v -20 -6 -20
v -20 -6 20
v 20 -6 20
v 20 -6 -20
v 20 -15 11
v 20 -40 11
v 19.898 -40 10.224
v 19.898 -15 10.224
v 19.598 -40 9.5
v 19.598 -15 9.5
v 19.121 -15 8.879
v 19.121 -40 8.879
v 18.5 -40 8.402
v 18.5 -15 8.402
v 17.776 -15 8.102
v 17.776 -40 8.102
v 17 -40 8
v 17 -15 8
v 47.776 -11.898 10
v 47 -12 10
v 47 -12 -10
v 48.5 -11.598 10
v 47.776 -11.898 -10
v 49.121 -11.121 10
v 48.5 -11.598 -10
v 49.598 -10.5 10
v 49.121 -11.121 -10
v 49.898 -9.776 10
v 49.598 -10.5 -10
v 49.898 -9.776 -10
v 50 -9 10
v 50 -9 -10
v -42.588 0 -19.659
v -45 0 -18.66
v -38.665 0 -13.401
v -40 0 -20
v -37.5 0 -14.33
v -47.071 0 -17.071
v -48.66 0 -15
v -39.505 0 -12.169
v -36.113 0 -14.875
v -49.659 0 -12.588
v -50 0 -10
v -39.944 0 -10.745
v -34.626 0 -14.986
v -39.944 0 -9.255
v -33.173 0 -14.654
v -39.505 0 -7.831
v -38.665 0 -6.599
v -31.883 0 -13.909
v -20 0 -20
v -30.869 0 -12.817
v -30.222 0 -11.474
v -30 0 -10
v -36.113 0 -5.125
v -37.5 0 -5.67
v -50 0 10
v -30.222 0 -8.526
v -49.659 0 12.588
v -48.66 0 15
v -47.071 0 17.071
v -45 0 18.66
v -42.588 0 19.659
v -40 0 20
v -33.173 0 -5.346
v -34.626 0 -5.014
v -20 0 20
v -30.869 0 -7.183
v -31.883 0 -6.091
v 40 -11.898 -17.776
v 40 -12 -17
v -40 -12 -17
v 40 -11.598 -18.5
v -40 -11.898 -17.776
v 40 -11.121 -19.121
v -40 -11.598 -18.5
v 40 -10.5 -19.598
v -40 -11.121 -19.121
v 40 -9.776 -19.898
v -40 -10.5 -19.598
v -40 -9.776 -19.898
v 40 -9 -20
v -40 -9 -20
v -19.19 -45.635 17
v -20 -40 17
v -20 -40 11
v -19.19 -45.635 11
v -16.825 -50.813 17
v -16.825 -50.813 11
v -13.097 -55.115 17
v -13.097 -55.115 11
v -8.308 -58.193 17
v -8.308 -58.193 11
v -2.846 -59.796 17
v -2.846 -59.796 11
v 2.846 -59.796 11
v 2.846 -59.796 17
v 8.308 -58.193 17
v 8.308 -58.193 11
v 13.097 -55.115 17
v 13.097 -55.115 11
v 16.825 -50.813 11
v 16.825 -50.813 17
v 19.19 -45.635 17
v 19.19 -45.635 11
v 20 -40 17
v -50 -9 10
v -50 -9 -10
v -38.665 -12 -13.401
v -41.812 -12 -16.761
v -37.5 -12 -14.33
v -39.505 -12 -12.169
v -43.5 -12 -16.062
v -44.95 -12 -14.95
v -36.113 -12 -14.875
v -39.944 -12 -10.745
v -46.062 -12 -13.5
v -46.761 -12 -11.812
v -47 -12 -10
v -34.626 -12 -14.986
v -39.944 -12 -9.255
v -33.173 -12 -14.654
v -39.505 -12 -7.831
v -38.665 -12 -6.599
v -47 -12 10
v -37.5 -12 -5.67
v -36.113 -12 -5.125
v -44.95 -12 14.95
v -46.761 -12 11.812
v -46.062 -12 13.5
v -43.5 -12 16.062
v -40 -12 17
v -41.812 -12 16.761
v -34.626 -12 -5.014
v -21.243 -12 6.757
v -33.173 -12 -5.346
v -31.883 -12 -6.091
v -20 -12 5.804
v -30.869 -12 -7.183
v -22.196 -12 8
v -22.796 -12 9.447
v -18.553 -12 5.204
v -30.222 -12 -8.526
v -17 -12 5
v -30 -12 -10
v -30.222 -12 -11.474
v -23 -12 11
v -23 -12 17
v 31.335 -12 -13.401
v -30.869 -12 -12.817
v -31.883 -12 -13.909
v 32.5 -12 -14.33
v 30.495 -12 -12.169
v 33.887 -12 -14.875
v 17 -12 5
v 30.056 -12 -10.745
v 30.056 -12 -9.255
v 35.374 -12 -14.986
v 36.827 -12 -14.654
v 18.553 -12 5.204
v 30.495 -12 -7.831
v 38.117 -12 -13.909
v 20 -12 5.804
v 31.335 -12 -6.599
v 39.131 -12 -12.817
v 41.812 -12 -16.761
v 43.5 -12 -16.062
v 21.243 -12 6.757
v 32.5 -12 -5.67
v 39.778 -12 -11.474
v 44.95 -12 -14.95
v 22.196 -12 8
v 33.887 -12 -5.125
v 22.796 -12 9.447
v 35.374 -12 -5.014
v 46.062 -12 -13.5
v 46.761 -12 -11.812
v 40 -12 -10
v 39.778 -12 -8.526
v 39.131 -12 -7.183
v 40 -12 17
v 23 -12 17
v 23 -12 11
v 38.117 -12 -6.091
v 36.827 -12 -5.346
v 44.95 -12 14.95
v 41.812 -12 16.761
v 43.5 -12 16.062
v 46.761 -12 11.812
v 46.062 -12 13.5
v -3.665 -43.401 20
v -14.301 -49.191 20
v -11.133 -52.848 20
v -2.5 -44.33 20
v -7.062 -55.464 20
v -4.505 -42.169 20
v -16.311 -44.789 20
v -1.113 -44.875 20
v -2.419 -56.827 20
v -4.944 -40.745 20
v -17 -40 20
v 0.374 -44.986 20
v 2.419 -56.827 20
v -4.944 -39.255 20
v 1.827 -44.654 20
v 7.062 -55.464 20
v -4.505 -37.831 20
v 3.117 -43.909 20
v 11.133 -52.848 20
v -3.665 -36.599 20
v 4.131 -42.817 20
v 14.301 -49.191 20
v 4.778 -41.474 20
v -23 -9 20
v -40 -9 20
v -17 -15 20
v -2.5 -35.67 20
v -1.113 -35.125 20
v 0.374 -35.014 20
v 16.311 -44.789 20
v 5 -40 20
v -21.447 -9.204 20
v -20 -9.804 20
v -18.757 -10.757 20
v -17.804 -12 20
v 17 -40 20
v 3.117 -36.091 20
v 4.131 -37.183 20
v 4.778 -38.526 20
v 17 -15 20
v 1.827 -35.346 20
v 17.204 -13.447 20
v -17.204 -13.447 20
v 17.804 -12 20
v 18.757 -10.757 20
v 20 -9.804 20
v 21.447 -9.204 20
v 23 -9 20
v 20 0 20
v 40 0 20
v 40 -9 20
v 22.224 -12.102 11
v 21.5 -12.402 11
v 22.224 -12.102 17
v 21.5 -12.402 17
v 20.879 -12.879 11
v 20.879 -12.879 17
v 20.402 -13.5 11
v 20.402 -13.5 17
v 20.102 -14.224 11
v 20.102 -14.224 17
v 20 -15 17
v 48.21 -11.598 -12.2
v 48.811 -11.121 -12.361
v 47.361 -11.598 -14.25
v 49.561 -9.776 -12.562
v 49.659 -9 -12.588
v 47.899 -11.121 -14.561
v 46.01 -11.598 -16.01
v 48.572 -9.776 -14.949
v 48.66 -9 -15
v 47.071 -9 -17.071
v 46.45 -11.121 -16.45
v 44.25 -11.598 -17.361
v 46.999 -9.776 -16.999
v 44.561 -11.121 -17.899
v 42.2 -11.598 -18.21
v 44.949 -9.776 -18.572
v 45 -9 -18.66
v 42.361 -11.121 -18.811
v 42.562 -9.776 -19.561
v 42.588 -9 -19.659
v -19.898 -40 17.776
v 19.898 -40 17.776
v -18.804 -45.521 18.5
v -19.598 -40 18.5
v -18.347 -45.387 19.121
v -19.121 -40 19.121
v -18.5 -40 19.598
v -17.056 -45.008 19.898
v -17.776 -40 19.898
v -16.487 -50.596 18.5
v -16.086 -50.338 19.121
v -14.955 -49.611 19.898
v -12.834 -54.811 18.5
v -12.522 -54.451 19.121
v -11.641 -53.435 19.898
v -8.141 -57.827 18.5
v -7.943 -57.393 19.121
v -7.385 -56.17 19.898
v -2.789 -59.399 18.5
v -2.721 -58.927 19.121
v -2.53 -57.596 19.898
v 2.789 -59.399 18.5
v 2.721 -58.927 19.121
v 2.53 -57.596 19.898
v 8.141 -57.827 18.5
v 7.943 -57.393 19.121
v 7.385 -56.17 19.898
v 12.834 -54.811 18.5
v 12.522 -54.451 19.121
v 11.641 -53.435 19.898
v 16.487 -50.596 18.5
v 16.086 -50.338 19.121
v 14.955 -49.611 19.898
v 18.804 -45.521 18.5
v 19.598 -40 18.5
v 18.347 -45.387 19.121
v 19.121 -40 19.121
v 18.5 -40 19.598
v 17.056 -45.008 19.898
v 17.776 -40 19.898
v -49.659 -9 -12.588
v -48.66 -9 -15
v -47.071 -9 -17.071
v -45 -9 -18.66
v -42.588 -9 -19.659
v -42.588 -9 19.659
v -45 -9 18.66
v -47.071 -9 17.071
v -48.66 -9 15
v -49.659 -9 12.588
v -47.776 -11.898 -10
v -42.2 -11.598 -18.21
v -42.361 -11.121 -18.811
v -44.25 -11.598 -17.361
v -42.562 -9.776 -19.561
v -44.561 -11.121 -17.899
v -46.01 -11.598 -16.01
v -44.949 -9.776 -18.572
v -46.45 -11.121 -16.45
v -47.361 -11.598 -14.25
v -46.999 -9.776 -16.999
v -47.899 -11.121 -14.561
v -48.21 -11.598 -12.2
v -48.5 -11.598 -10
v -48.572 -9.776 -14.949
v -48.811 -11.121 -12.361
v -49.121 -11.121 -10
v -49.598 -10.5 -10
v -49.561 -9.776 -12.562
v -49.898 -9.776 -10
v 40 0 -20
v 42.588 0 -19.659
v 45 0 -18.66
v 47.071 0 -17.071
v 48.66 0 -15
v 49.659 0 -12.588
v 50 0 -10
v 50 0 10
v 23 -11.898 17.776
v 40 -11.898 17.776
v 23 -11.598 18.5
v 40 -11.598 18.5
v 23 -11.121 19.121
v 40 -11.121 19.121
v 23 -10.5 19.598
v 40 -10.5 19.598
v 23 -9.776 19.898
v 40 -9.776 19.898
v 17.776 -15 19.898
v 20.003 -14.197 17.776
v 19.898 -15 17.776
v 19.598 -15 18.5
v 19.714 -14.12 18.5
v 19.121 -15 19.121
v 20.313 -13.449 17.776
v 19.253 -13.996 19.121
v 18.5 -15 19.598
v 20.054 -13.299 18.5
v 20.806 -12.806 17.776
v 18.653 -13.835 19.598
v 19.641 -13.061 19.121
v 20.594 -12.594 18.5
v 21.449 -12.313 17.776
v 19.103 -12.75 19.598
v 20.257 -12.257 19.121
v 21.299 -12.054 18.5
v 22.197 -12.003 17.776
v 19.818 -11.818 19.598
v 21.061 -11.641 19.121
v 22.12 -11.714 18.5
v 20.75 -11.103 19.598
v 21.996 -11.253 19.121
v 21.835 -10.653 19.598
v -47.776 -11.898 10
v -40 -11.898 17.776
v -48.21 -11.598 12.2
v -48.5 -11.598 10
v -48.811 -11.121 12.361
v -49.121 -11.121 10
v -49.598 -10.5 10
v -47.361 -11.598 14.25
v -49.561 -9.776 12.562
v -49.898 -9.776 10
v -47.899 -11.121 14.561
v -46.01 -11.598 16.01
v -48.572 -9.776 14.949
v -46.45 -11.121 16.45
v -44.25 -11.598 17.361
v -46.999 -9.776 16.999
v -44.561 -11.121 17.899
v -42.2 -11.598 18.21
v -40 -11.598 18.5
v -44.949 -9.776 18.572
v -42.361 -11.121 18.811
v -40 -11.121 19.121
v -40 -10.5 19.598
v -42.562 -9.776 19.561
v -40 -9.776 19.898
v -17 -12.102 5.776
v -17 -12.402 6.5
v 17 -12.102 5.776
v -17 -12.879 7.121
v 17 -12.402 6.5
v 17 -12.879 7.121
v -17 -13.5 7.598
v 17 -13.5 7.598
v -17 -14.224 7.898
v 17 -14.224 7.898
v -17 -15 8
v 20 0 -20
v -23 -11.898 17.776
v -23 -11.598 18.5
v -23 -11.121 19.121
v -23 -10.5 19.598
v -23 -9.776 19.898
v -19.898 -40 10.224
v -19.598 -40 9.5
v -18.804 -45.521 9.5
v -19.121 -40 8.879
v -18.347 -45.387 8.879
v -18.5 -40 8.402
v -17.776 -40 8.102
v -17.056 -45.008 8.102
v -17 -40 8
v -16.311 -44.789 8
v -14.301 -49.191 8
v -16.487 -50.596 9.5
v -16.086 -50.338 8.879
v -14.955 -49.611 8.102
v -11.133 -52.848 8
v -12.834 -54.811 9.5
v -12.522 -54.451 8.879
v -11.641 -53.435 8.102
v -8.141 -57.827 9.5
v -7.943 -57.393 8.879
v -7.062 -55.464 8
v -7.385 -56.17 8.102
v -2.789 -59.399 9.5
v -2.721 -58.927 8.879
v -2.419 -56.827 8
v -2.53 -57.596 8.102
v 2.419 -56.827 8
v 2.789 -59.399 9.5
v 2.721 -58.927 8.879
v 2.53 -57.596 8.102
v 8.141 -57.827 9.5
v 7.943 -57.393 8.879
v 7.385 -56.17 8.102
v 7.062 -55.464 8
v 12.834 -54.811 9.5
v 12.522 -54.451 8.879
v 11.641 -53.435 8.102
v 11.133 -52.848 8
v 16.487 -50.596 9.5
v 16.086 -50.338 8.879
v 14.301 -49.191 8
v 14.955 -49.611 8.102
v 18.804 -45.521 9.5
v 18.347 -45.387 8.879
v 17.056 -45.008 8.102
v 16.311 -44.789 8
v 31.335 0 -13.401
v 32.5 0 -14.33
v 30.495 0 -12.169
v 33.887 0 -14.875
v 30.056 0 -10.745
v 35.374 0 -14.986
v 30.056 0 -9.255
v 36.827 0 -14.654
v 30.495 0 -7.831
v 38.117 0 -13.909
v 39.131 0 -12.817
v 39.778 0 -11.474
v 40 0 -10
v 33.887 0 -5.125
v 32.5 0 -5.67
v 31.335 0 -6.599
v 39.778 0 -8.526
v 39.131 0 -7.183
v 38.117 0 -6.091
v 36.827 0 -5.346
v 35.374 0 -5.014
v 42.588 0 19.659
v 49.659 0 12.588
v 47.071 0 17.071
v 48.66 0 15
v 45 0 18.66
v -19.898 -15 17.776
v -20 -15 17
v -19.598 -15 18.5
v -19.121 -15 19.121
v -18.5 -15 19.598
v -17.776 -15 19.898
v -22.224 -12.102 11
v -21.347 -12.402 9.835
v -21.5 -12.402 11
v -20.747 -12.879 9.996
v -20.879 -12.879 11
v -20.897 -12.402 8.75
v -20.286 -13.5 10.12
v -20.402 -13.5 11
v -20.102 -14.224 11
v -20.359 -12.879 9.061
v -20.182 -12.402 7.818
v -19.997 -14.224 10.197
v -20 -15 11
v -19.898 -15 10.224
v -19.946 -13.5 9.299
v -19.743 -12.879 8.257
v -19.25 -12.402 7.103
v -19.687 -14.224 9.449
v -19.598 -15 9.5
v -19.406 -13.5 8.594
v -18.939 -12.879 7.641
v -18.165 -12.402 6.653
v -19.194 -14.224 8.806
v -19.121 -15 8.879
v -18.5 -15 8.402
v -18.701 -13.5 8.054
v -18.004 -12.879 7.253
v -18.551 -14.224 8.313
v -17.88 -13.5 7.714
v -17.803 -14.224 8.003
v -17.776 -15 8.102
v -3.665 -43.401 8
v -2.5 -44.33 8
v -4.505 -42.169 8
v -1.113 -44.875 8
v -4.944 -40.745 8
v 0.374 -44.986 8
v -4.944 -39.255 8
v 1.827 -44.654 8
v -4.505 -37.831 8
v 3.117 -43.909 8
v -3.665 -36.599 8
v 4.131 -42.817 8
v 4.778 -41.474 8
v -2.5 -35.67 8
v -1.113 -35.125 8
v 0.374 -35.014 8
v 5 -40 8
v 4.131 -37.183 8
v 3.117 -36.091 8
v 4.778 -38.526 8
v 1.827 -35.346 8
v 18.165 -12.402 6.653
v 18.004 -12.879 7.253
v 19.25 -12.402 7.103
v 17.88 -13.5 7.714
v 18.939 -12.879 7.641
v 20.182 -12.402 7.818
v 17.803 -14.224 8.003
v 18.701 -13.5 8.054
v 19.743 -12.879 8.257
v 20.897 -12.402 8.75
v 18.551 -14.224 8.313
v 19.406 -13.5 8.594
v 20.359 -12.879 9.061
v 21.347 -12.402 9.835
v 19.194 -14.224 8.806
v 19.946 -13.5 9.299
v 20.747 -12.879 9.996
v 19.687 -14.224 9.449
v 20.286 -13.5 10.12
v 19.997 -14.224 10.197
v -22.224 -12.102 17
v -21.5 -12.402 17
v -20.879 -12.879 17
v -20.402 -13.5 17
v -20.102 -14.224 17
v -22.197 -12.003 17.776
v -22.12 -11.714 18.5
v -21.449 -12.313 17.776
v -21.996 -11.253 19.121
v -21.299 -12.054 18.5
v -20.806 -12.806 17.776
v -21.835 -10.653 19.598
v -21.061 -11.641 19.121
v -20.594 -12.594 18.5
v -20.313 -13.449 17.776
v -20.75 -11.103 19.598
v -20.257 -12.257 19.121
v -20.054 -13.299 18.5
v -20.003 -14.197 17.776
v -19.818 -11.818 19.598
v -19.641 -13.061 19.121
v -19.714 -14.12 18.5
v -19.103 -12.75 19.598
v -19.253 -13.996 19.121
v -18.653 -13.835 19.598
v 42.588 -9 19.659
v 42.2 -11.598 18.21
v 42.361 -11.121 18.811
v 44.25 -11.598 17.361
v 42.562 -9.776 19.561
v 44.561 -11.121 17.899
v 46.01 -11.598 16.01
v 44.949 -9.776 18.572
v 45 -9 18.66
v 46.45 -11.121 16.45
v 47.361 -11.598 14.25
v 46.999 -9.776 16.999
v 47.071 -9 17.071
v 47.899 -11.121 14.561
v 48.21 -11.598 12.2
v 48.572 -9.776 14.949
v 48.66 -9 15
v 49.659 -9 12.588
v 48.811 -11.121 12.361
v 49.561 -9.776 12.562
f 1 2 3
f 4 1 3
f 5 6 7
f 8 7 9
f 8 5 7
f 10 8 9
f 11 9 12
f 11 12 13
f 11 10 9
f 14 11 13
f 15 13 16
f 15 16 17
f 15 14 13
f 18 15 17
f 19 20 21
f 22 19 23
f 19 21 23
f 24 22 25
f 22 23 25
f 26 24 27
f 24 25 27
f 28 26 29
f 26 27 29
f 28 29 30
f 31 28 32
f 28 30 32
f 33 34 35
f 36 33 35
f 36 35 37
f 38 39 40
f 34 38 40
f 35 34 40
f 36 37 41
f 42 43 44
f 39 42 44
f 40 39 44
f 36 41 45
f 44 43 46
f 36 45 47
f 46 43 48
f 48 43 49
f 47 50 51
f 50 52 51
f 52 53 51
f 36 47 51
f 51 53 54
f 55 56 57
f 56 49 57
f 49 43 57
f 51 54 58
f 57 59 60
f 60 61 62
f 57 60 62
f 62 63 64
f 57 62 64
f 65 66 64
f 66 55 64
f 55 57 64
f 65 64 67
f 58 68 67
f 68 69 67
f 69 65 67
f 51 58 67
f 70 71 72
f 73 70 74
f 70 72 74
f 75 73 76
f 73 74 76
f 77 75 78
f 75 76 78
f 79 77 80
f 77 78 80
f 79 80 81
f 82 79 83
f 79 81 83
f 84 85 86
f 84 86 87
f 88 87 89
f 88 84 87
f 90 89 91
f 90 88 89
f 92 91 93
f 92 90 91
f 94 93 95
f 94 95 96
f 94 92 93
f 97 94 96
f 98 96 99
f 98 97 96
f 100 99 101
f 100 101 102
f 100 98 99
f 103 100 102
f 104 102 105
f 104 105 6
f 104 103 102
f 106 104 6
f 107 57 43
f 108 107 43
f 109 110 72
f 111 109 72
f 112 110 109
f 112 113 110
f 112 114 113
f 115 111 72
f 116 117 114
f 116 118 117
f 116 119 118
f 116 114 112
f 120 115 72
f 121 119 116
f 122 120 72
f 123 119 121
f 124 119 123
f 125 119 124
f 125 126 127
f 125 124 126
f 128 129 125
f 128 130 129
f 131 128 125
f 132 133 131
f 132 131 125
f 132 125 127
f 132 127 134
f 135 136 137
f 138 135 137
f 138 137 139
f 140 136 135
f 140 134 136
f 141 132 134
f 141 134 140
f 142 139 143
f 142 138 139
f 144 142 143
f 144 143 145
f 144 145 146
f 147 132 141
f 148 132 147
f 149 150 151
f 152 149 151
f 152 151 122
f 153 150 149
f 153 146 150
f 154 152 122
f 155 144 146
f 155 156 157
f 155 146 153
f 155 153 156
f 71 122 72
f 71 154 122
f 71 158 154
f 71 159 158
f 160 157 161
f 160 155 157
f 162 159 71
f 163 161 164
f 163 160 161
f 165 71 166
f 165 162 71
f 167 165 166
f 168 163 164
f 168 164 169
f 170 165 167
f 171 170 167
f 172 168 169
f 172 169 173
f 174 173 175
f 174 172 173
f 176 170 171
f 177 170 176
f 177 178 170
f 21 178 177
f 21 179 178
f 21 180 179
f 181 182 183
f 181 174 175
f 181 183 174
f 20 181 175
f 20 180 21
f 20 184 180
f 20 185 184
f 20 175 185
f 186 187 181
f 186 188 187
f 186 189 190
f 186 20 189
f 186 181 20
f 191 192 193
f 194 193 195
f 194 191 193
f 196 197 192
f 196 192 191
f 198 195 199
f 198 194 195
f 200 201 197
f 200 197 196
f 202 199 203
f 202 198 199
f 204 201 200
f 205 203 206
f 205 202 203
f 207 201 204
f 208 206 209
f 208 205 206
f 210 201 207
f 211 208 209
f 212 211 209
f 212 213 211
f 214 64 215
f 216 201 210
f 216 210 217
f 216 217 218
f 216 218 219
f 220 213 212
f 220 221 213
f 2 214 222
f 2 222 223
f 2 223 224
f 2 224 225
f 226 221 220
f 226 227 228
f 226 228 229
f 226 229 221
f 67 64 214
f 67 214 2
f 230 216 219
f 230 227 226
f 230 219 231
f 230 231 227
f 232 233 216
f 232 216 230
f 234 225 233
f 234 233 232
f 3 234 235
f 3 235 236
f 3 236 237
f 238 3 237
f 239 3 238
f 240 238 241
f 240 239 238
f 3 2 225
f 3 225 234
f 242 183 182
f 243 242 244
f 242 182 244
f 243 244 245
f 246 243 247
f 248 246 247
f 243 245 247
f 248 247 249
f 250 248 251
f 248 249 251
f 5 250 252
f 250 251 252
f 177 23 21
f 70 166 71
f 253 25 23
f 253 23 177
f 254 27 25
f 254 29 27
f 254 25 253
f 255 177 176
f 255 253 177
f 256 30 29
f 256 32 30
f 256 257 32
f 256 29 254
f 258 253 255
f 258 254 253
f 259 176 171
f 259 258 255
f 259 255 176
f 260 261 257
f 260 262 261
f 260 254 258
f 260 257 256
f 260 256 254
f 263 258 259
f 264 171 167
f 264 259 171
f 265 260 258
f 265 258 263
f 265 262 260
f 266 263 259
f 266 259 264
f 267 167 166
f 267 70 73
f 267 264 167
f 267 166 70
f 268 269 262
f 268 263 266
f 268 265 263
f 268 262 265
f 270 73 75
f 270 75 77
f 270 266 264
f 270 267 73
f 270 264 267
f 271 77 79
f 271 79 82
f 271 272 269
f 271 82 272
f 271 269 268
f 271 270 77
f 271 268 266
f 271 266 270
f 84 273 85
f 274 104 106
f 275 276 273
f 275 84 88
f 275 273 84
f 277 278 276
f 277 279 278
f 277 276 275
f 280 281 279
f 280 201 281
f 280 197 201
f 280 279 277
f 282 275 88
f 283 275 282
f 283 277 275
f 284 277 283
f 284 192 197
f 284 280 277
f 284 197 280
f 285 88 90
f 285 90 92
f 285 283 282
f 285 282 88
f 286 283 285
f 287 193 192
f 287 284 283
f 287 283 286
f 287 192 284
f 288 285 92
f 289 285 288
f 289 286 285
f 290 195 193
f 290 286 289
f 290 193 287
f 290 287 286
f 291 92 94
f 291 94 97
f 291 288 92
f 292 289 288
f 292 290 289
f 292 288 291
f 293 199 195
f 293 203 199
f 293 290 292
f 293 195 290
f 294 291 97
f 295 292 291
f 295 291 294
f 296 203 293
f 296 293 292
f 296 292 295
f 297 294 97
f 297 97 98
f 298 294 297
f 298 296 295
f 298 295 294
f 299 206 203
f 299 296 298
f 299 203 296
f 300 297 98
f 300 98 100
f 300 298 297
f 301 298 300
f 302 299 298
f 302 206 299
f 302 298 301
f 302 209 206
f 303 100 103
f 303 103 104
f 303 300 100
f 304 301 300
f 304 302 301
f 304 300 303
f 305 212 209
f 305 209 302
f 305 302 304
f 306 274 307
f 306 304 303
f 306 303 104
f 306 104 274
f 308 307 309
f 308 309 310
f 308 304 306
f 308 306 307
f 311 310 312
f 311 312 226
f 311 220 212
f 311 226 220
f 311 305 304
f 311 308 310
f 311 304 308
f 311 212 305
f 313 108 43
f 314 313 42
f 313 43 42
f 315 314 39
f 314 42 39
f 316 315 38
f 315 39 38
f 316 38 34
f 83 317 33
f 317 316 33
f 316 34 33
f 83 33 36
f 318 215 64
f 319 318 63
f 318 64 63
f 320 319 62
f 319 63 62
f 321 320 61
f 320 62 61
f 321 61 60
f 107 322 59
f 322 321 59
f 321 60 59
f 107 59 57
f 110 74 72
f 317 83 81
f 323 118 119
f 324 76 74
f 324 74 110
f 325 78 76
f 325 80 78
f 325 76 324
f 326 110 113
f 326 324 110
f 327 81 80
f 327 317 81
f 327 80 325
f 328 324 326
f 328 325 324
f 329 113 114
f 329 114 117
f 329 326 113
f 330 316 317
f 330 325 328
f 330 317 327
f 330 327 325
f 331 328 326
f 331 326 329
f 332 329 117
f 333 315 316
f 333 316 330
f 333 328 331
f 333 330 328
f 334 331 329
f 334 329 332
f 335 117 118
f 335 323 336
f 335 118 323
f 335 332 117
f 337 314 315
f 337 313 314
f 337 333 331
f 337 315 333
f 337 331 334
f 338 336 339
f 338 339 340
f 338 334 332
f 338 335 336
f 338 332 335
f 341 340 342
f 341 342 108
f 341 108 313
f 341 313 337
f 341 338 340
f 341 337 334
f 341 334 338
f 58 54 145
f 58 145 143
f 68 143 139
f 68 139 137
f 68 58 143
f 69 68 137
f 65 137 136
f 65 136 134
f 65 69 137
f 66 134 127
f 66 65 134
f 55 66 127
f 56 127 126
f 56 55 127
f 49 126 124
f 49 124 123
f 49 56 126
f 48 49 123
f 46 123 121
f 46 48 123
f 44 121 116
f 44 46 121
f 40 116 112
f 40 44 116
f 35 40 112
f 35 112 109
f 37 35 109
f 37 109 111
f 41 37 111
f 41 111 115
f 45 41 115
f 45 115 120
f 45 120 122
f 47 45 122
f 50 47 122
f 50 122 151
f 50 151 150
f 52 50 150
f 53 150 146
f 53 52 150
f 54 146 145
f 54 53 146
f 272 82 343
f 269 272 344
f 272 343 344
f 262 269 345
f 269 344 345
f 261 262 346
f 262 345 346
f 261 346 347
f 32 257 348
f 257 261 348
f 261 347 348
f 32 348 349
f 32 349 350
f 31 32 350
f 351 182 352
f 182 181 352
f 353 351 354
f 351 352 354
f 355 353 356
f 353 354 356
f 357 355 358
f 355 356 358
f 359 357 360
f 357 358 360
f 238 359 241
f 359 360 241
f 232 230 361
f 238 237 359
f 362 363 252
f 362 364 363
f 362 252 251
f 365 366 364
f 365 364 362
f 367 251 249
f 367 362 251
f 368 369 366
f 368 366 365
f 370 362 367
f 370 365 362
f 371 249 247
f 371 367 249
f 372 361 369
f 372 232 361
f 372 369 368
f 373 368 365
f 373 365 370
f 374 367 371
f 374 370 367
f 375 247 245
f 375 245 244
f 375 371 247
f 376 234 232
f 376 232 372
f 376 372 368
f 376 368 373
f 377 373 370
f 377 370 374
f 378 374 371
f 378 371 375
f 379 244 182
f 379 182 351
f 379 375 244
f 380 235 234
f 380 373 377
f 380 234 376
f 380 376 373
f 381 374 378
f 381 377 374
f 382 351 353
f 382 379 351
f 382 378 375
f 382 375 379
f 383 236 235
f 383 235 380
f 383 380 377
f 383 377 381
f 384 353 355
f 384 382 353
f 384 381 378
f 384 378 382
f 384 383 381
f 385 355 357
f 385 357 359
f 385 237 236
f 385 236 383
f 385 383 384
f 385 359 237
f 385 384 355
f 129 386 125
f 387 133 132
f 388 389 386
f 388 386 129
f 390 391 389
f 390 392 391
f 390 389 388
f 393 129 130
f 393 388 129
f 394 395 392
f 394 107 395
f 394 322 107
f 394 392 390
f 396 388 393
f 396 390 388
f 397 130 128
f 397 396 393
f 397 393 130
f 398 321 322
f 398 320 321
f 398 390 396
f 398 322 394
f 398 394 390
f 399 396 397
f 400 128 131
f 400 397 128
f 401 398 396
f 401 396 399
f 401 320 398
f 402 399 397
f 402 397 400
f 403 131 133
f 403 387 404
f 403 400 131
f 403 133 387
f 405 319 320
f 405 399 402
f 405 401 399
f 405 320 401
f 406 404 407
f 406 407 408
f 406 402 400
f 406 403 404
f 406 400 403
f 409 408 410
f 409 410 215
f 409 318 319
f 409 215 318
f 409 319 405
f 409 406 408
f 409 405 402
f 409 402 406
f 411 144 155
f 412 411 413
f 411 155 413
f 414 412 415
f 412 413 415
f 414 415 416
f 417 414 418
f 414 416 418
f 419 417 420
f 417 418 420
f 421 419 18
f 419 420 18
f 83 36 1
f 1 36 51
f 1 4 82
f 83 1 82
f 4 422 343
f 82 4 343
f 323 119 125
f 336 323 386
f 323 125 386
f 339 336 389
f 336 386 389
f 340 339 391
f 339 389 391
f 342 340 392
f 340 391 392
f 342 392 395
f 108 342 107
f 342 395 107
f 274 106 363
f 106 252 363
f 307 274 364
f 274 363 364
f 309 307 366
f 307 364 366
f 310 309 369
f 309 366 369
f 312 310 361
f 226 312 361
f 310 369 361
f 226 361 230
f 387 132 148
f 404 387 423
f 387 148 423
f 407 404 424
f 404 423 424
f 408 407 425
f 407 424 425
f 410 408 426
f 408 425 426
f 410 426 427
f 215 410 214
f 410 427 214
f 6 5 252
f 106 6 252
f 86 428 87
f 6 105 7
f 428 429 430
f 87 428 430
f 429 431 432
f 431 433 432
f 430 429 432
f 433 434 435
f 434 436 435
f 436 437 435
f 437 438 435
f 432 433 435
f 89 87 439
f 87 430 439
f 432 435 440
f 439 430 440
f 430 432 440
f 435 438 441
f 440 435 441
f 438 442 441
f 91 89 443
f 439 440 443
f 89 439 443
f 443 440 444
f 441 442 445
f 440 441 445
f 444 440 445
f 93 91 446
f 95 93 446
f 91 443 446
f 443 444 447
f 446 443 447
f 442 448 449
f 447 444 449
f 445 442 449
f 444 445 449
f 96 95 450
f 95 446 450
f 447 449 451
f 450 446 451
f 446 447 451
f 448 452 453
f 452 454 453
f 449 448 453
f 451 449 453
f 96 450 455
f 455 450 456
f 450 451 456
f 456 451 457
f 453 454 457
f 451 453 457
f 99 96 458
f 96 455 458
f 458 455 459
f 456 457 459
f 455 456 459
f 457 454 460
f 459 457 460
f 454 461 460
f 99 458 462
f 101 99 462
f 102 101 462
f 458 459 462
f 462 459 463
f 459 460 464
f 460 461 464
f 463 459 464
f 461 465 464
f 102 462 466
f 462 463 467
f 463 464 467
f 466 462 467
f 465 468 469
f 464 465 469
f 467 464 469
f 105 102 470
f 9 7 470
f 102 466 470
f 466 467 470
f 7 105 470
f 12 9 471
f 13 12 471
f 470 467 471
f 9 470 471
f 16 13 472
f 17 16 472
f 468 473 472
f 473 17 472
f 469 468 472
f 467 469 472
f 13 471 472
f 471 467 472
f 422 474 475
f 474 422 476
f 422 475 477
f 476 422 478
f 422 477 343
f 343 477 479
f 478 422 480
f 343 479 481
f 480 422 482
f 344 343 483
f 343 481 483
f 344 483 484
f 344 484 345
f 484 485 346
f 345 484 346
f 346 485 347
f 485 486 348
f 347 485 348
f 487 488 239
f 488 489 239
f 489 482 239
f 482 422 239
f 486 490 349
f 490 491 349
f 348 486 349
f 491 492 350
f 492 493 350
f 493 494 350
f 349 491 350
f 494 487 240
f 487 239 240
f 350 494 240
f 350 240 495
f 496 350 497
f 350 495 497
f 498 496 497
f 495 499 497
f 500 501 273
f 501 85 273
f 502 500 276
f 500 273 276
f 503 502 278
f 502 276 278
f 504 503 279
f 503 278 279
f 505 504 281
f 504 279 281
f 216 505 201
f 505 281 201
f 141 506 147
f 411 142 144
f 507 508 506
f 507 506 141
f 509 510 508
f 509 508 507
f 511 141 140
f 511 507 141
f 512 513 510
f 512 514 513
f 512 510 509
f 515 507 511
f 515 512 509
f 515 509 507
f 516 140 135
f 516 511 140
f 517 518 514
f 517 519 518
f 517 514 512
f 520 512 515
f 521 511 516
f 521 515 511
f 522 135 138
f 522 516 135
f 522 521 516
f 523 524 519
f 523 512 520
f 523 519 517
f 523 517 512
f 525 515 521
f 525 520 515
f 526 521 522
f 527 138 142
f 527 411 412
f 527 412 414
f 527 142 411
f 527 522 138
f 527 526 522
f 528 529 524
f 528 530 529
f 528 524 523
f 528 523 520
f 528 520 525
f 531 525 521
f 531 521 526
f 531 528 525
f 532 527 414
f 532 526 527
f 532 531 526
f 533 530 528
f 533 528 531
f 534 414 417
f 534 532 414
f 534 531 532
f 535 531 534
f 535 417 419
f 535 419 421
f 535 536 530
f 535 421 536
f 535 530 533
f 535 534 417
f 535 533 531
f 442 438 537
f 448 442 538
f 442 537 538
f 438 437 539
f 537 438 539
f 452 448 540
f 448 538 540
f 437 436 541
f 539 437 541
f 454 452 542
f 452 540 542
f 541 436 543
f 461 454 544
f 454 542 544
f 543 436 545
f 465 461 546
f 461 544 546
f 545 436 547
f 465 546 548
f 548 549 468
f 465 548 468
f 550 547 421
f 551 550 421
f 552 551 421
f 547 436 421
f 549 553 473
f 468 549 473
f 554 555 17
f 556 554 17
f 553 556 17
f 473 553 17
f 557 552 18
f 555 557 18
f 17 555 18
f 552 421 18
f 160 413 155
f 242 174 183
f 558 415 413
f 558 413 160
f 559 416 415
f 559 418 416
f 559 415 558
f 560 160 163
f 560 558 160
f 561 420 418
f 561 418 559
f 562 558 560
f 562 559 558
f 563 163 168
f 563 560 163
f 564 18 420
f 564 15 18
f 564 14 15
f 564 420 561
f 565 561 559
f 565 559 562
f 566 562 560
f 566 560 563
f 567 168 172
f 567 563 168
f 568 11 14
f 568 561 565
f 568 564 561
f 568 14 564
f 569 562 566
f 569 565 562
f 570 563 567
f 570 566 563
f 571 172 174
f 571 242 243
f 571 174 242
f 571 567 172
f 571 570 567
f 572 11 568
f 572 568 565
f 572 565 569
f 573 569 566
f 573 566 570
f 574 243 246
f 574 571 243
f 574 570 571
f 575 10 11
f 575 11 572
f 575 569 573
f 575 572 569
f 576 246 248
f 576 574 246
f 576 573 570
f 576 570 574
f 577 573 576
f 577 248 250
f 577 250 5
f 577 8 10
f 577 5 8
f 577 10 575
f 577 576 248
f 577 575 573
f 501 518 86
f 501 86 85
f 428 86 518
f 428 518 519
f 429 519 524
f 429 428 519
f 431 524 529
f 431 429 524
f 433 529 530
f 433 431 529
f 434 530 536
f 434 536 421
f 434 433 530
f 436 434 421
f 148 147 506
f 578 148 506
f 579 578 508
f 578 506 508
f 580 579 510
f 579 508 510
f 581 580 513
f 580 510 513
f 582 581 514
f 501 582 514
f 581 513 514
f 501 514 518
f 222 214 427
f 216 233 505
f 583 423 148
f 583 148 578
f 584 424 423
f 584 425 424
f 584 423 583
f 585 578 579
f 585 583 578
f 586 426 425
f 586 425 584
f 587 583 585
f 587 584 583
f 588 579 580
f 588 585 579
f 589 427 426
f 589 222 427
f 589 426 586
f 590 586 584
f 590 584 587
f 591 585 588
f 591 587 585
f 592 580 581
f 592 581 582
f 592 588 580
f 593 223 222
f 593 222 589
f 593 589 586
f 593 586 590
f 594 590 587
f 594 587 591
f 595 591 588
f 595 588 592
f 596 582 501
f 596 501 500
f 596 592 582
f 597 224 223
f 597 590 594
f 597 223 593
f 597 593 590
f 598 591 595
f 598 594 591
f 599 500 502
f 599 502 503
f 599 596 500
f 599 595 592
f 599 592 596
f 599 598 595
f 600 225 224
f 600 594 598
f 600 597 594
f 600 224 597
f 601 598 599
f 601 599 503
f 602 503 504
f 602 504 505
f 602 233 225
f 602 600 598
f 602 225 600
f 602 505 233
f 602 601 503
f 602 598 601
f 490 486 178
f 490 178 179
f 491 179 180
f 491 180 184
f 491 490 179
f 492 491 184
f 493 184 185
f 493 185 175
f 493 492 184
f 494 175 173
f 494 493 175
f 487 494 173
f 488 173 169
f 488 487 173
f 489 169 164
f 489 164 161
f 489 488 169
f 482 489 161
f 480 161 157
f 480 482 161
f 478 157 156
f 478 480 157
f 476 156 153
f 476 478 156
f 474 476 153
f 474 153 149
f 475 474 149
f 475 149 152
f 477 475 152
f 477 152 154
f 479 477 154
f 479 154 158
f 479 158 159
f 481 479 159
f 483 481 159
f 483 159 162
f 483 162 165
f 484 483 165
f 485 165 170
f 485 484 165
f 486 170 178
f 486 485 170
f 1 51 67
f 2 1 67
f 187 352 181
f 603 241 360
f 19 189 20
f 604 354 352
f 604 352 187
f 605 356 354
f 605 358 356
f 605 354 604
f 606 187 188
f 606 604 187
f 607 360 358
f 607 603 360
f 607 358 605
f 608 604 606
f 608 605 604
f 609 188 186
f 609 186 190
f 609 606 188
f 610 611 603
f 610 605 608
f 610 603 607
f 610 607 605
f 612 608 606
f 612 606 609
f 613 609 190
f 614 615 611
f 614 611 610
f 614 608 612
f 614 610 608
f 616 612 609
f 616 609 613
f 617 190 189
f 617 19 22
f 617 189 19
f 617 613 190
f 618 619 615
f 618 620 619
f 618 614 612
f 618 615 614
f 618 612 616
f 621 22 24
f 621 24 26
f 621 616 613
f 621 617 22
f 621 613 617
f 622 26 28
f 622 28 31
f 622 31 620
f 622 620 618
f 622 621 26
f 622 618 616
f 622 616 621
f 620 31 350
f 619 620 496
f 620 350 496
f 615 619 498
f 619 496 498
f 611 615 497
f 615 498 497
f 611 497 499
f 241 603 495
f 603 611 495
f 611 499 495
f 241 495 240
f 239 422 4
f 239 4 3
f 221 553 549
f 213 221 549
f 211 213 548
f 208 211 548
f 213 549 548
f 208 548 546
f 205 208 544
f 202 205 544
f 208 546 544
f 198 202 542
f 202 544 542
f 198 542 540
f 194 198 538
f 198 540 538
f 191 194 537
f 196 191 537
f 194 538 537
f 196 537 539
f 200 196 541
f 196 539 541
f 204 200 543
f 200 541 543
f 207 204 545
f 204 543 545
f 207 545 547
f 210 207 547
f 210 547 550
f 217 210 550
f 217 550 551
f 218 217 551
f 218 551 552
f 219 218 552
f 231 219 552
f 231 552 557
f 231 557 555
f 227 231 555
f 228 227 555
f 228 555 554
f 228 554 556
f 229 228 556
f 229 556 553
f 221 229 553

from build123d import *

# Parameters (mm, degrees)
F0_R      = 5
F1_DEPTH  = 12
F2_W      = 40
F2_H      = 40
F3_DEPTH  = 6
F4_W      = 40
F4_H      = 12
F5_DEPTH  = 28
F7_DEPTH  = 12
F8_F1_R   = 3
F8_F2_R   = 3
F9_R      = 3
F10_R     = 5
F11_DEPTH = 25


with BuildPart() as f1:
    # F0 (on Front) → F1 (new body)
    with BuildSketch(Plane.XZ):
        with BuildLine():
            Line((40, 20), (-40, 20))
            ThreePointArc((-40, 20), (-47.0710678119, 17.0710678119), (-50, 10))
            Line((-50, 10), (-50, -10))
            ThreePointArc((-50, -10), (-47.0710678119, -17.0710678119), (-40, -20))
            Line((-40, -20), (40, -20))
            ThreePointArc((40, -20), (47.0710678119, -17.0710678119), (50, -10))
            Line((50, -10), (50, 10))
            ThreePointArc((50, 10), (47.0710678119, 17.0710678119), (40, 20))
        make_face()
        with Locations((-35, -10)):
            Circle(F0_R, mode=Mode.SUBTRACT)
        with Locations((35, -10)):
            Circle(F0_R, mode=Mode.SUBTRACT)
    extrude(amount=F1_DEPTH)

    # F2 (on Front) → F3 (cut)
    with BuildSketch(Plane.XZ):
        Rectangle(F2_W, F2_H)
    extrude(amount=F3_DEPTH, mode=Mode.SUBTRACT)

    # F4 (on face) → F5 (join)
    with BuildSketch(Plane.XZ.offset(12)):
        with Locations((0, 14)):
            Rectangle(F4_W, F4_H)
    extrude(amount=F5_DEPTH)

    # F6 (on face) → F7 (join)
    with BuildSketch(Plane.XY.offset(20)):
        with BuildLine():
            Line((20, -40), (-20, -40))
            ThreePointArc((-20, -40), (0, -60), (20, -40))
        make_face()
    extrude(amount=-F7_DEPTH)

    # F8: fillet of radius 3 on 4 edges, made by hand

    # F8_f1
    f8_f1_edges = [f1.edges().sort_by_distance(p)[0] for p in [
        (-20, -26, 8),
        (0, -60, 8),
        (20, -26, 8),
    ]]
    fillet(f8_f1_edges, radius=F8_F1_R)

    # F8_f2
    f8_f2_edges = [f1.edges().sort_by_distance(p)[0] for p in [
        (0, -12, 8),
        (-19.1213203436, -12, 8.8786796564),
        (19.1213203436, -12, 8.8786796564),
    ]]
    fillet(f8_f2_edges, radius=F8_F2_R)

    # F9
    f9_edges = [f1.edges().sort_by_distance(p)[0] for p in [
        (-20, -40, 15.5),
        (0, -60, 11),
        (0, -60, 20),
        (20, -40, 15.5),
        (-31.5, -12, 20),
        (-47.071068, -12, 17.071068),
        (-50, -12, 0),
        (-47.071068, -12, -17.071068),
        (0, -12, -20),
        (47.071068, -12, -17.071068),
        (31.5, -12, 20),
        (50, -12, 0),
        (47.071068, -12, 17.071068),
        (20.87868, -12.87868, 20),
        (20, -27.5, 20),
        (-20, -27.5, 20),
        (-20.87868, -12.87868, 20),
    ]]
    fillet(f9_edges, radius=F9_R)

    # F10 (on face) → F11 (cut)
    with BuildSketch(Plane(origin=(0, 0, 8), x_dir=(1, 0, 0), z_dir=(0, 0, -1))):
        with Locations((0, 40)):
            Circle(F10_R)
    extrude(amount=-F11_DEPTH, mode=Mode.SUBTRACT)


solid = f1.part
